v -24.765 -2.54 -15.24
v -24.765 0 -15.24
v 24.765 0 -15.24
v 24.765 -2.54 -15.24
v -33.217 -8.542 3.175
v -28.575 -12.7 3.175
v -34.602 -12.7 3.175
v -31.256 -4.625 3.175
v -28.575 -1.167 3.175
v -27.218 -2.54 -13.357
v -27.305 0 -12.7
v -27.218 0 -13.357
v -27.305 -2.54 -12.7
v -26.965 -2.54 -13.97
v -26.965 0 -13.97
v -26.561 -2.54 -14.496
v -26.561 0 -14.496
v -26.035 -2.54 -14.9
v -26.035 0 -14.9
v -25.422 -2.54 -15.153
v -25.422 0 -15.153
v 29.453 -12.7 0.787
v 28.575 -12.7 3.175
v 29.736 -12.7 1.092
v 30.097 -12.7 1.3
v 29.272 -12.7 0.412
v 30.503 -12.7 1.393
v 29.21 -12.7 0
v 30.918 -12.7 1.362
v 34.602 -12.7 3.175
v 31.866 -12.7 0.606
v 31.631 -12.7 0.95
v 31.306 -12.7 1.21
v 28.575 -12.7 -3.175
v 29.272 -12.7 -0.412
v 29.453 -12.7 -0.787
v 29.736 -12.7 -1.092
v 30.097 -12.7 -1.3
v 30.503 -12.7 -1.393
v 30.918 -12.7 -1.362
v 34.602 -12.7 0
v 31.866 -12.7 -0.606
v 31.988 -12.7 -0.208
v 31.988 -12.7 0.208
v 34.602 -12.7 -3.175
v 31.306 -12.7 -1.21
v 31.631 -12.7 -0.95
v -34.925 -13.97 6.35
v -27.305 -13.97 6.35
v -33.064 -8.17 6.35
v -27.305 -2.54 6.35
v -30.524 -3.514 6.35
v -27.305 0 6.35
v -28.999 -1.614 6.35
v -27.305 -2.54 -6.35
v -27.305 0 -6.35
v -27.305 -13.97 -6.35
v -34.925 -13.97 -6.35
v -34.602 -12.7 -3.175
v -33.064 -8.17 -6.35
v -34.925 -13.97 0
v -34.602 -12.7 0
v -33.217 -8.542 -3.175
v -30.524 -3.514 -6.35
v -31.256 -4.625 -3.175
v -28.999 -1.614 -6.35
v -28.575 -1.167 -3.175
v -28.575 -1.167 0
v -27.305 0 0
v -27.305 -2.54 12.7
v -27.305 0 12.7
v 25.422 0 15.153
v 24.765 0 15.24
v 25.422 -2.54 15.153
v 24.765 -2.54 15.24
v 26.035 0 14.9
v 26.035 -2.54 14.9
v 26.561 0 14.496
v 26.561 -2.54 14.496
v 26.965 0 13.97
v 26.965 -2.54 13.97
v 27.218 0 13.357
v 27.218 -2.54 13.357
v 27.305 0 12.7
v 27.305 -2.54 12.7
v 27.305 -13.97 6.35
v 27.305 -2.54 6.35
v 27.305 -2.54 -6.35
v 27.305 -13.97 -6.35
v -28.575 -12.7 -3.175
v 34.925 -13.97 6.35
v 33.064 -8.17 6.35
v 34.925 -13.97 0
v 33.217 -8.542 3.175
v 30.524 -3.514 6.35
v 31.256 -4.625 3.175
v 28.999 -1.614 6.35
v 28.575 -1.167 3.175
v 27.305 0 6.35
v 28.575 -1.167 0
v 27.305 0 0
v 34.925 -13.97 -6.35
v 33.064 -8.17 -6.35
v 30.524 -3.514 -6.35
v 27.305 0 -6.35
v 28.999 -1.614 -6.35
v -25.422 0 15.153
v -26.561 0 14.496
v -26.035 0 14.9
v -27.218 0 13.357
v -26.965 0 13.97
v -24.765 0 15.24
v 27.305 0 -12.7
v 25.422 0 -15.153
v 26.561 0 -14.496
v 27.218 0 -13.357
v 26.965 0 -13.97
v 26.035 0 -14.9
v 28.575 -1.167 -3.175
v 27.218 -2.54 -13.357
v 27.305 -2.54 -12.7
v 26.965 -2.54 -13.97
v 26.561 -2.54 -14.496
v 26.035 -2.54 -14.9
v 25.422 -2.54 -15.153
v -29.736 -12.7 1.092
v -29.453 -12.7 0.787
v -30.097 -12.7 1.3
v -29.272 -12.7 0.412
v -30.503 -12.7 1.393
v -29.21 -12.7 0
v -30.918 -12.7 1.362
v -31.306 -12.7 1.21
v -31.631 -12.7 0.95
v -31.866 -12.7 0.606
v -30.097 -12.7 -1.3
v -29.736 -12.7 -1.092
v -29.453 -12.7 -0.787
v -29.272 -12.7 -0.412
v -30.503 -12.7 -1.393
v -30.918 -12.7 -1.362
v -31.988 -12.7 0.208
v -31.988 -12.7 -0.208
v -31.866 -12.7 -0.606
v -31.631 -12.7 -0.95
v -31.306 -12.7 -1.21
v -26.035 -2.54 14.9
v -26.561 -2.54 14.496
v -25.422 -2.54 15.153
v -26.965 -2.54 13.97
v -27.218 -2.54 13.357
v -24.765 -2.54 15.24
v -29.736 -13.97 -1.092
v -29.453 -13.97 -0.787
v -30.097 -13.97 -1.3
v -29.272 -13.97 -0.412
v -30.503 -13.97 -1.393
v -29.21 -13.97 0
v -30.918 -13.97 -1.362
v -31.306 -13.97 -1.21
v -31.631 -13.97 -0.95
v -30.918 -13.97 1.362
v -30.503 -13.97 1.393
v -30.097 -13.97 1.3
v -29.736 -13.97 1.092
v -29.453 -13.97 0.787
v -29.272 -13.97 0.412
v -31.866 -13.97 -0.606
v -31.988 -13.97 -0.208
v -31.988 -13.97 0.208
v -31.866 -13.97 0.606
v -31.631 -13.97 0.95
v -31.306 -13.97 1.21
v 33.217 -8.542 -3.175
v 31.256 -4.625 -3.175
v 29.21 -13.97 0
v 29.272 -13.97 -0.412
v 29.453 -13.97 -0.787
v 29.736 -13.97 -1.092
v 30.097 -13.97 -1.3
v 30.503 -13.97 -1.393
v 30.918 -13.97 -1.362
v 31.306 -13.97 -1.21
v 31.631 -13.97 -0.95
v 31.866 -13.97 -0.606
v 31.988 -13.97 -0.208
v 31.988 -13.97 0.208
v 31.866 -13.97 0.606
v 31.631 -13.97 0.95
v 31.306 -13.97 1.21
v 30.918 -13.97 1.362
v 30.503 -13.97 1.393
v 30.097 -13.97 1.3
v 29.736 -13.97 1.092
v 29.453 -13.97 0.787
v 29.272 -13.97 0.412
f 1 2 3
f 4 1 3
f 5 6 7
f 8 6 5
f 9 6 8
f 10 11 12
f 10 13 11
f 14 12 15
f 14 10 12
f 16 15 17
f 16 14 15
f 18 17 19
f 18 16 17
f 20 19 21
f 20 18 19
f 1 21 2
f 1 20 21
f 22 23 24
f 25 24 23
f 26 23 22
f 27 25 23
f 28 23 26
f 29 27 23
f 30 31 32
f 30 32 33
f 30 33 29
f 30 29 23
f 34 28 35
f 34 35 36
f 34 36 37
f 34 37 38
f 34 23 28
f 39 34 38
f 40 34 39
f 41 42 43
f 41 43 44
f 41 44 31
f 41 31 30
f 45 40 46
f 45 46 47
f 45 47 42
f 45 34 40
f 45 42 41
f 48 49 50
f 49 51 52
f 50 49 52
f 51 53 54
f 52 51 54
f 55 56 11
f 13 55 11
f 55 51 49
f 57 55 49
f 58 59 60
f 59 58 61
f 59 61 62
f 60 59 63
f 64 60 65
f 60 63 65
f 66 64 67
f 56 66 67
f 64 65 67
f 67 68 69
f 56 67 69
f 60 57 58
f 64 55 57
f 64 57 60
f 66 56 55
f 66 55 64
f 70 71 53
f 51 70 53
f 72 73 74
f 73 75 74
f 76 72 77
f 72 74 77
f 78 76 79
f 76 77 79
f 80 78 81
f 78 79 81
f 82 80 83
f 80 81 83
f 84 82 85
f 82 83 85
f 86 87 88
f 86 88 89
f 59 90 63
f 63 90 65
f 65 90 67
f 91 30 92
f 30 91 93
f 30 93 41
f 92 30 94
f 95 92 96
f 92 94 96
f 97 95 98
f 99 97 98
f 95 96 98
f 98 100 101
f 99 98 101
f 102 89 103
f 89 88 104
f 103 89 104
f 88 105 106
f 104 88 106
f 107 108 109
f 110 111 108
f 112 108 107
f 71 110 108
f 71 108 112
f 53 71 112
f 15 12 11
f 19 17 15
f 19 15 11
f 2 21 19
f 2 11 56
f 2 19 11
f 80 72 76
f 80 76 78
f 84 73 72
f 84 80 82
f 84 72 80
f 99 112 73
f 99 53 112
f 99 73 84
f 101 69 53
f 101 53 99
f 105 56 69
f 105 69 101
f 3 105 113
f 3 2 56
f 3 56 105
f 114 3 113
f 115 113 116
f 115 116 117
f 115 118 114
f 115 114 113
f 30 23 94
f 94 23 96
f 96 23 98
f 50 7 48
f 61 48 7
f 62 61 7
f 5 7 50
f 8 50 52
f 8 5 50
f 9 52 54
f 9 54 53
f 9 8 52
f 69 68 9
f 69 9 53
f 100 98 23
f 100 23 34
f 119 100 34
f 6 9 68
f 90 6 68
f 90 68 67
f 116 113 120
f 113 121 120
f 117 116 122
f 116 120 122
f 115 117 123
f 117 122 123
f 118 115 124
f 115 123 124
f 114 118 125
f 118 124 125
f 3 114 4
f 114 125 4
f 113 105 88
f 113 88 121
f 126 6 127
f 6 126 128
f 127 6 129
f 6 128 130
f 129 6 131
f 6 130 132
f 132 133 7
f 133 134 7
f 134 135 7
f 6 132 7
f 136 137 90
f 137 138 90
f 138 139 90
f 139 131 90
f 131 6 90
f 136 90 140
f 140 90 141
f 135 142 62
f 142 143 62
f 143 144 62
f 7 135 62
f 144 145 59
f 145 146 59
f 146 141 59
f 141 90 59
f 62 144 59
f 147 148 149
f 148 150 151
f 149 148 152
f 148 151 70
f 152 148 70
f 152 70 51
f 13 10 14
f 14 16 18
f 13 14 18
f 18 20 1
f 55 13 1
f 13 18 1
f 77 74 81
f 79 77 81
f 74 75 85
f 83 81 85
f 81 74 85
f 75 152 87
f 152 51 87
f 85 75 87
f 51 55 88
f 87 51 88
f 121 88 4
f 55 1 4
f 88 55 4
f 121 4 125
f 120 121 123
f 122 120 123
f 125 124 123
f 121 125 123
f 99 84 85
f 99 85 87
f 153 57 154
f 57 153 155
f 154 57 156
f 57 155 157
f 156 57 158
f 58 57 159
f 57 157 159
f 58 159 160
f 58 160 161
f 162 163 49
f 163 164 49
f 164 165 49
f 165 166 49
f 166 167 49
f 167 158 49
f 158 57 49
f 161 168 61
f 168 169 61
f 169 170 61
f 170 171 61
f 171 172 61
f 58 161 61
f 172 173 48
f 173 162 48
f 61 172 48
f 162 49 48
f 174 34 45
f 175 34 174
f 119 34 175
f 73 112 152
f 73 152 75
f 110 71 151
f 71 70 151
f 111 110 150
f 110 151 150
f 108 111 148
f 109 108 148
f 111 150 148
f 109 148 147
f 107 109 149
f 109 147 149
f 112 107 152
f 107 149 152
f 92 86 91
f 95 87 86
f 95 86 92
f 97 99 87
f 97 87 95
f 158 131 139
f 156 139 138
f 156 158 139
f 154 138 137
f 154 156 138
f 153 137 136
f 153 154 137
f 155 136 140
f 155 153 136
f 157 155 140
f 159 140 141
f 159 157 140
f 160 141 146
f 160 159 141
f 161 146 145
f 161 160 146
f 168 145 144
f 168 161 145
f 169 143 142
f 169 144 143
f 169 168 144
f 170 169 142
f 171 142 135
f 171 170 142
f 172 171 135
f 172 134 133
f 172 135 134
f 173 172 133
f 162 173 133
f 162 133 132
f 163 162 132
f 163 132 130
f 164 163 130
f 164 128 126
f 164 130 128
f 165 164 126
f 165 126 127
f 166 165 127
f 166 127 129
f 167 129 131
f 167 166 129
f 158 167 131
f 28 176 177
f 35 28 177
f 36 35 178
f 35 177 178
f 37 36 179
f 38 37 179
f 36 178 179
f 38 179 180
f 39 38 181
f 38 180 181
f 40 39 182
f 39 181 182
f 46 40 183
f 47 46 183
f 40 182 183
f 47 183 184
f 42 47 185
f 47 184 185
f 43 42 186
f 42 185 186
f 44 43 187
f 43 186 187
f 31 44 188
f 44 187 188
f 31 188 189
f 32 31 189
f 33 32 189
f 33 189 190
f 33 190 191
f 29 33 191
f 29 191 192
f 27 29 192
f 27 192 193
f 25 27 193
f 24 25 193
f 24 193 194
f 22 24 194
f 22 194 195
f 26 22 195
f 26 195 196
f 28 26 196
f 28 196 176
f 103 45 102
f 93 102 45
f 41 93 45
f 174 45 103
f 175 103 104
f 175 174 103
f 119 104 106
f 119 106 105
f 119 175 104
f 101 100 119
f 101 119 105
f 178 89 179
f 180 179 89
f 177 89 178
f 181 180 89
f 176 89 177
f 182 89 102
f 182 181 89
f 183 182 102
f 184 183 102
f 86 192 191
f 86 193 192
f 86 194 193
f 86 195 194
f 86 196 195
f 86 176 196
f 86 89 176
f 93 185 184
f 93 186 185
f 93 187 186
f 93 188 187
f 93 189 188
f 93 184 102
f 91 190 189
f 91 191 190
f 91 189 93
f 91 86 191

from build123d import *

# Parameters (mm, degrees)
SKETCH1_W           = 54.61
SKETCH1_H           = 30.48
BOSS_EXTRUDE1_DEPTH = 2.54
FILLET1_R           = 2.54
BOSS_EXTRUDE2_DEPTH = 6.35
SKETCH3_W           = 6.35
SKETCH3_H           = 6.35
CUT_EXTRUDE1_DEPTH  = 12.7
SKETCH4_R           = 1.397
CUT_EXTRUDE2_DEPTH  = 14.9700001


with BuildPart() as part:
    # Sketch1 → Boss-Extrude1 (new body)
    with BuildSketch(Plane(origin=(0, 0, 0), x_dir=(1, 0, 0), z_dir=(0, 1, 0))):
        Rectangle(SKETCH1_W, SKETCH1_H)
    extrude(amount=-BOSS_EXTRUDE1_DEPTH)

    # Fillet1
    fillet1_edges = [part.edges().sort_by_distance(p)[0] for p in [
        (27.305, -1.27, 15.24),
        (-27.305, -1.27, 15.24),
        (-27.305, -1.27, -15.24),
        (27.305, -1.27, -15.24),
    ]]
    fillet(fillet1_edges, radius=FILLET1_R)

    # Sketch2 → Boss-Extrude2 (add, symmetric)
    with BuildSketch(Plane.XY):
        with BuildLine():
            add(Edge.make_bspline(
                [(34.925, -13.97), (32.641767313, -4.413096047), (27.305, 0)],
                knots=[0, 0, 0, 0.368203859, 0.368203859, 0.368203859], degree=2))
            Line((27.305, 0), (27.305, -13.97))
            Line((27.305, -13.97), (34.925, -13.97))
        make_face()
    boss_extrude2 = extrude(amount=BOSS_EXTRUDE2_DEPTH, both=True)

    # Sketch3 → Cut-Extrude1 (cut)
    with BuildSketch(Plane(origin=(0, 0, 0), x_dir=(1, 0, 0), z_dir=(0, 1, 0))):
        with Locations((31.75, 0)):
            Rectangle(SKETCH3_W, SKETCH3_H)
    cut_extrude1 = extrude(amount=-CUT_EXTRUDE1_DEPTH, mode=Mode.SUBTRACT)

    # Sketch4 → Cut-Extrude2 (cut, through all)
    with BuildSketch(Plane(origin=(0, -13.97, 0), x_dir=(-1, 0, 0), z_dir=(0, -1, 0))):
        with Locations((-30.607, 0)):
            Circle(SKETCH4_R)
    cut_extrude2 = extrude(amount=-CUT_EXTRUDE2_DEPTH, mode=Mode.SUBTRACT)

    # Mirror1: Boss-Extrude2, Cut-Extrude1, Cut-Extrude2 across plane
    add(boss_extrude2.mirror(Plane(origin=(0, 0, 0), x_dir=(0, 0, 1), z_dir=(1, 0, 0))))
    add(cut_extrude1.mirror(Plane(origin=(0, 0, 0), x_dir=(0, 0, 1), z_dir=(1, 0, 0))), mode=Mode.SUBTRACT)
    add(cut_extrude2.mirror(Plane(origin=(0, 0, 0), x_dir=(0, 0, 1), z_dir=(1, 0, 0))), mode=Mode.SUBTRACT)


solid = part.part
